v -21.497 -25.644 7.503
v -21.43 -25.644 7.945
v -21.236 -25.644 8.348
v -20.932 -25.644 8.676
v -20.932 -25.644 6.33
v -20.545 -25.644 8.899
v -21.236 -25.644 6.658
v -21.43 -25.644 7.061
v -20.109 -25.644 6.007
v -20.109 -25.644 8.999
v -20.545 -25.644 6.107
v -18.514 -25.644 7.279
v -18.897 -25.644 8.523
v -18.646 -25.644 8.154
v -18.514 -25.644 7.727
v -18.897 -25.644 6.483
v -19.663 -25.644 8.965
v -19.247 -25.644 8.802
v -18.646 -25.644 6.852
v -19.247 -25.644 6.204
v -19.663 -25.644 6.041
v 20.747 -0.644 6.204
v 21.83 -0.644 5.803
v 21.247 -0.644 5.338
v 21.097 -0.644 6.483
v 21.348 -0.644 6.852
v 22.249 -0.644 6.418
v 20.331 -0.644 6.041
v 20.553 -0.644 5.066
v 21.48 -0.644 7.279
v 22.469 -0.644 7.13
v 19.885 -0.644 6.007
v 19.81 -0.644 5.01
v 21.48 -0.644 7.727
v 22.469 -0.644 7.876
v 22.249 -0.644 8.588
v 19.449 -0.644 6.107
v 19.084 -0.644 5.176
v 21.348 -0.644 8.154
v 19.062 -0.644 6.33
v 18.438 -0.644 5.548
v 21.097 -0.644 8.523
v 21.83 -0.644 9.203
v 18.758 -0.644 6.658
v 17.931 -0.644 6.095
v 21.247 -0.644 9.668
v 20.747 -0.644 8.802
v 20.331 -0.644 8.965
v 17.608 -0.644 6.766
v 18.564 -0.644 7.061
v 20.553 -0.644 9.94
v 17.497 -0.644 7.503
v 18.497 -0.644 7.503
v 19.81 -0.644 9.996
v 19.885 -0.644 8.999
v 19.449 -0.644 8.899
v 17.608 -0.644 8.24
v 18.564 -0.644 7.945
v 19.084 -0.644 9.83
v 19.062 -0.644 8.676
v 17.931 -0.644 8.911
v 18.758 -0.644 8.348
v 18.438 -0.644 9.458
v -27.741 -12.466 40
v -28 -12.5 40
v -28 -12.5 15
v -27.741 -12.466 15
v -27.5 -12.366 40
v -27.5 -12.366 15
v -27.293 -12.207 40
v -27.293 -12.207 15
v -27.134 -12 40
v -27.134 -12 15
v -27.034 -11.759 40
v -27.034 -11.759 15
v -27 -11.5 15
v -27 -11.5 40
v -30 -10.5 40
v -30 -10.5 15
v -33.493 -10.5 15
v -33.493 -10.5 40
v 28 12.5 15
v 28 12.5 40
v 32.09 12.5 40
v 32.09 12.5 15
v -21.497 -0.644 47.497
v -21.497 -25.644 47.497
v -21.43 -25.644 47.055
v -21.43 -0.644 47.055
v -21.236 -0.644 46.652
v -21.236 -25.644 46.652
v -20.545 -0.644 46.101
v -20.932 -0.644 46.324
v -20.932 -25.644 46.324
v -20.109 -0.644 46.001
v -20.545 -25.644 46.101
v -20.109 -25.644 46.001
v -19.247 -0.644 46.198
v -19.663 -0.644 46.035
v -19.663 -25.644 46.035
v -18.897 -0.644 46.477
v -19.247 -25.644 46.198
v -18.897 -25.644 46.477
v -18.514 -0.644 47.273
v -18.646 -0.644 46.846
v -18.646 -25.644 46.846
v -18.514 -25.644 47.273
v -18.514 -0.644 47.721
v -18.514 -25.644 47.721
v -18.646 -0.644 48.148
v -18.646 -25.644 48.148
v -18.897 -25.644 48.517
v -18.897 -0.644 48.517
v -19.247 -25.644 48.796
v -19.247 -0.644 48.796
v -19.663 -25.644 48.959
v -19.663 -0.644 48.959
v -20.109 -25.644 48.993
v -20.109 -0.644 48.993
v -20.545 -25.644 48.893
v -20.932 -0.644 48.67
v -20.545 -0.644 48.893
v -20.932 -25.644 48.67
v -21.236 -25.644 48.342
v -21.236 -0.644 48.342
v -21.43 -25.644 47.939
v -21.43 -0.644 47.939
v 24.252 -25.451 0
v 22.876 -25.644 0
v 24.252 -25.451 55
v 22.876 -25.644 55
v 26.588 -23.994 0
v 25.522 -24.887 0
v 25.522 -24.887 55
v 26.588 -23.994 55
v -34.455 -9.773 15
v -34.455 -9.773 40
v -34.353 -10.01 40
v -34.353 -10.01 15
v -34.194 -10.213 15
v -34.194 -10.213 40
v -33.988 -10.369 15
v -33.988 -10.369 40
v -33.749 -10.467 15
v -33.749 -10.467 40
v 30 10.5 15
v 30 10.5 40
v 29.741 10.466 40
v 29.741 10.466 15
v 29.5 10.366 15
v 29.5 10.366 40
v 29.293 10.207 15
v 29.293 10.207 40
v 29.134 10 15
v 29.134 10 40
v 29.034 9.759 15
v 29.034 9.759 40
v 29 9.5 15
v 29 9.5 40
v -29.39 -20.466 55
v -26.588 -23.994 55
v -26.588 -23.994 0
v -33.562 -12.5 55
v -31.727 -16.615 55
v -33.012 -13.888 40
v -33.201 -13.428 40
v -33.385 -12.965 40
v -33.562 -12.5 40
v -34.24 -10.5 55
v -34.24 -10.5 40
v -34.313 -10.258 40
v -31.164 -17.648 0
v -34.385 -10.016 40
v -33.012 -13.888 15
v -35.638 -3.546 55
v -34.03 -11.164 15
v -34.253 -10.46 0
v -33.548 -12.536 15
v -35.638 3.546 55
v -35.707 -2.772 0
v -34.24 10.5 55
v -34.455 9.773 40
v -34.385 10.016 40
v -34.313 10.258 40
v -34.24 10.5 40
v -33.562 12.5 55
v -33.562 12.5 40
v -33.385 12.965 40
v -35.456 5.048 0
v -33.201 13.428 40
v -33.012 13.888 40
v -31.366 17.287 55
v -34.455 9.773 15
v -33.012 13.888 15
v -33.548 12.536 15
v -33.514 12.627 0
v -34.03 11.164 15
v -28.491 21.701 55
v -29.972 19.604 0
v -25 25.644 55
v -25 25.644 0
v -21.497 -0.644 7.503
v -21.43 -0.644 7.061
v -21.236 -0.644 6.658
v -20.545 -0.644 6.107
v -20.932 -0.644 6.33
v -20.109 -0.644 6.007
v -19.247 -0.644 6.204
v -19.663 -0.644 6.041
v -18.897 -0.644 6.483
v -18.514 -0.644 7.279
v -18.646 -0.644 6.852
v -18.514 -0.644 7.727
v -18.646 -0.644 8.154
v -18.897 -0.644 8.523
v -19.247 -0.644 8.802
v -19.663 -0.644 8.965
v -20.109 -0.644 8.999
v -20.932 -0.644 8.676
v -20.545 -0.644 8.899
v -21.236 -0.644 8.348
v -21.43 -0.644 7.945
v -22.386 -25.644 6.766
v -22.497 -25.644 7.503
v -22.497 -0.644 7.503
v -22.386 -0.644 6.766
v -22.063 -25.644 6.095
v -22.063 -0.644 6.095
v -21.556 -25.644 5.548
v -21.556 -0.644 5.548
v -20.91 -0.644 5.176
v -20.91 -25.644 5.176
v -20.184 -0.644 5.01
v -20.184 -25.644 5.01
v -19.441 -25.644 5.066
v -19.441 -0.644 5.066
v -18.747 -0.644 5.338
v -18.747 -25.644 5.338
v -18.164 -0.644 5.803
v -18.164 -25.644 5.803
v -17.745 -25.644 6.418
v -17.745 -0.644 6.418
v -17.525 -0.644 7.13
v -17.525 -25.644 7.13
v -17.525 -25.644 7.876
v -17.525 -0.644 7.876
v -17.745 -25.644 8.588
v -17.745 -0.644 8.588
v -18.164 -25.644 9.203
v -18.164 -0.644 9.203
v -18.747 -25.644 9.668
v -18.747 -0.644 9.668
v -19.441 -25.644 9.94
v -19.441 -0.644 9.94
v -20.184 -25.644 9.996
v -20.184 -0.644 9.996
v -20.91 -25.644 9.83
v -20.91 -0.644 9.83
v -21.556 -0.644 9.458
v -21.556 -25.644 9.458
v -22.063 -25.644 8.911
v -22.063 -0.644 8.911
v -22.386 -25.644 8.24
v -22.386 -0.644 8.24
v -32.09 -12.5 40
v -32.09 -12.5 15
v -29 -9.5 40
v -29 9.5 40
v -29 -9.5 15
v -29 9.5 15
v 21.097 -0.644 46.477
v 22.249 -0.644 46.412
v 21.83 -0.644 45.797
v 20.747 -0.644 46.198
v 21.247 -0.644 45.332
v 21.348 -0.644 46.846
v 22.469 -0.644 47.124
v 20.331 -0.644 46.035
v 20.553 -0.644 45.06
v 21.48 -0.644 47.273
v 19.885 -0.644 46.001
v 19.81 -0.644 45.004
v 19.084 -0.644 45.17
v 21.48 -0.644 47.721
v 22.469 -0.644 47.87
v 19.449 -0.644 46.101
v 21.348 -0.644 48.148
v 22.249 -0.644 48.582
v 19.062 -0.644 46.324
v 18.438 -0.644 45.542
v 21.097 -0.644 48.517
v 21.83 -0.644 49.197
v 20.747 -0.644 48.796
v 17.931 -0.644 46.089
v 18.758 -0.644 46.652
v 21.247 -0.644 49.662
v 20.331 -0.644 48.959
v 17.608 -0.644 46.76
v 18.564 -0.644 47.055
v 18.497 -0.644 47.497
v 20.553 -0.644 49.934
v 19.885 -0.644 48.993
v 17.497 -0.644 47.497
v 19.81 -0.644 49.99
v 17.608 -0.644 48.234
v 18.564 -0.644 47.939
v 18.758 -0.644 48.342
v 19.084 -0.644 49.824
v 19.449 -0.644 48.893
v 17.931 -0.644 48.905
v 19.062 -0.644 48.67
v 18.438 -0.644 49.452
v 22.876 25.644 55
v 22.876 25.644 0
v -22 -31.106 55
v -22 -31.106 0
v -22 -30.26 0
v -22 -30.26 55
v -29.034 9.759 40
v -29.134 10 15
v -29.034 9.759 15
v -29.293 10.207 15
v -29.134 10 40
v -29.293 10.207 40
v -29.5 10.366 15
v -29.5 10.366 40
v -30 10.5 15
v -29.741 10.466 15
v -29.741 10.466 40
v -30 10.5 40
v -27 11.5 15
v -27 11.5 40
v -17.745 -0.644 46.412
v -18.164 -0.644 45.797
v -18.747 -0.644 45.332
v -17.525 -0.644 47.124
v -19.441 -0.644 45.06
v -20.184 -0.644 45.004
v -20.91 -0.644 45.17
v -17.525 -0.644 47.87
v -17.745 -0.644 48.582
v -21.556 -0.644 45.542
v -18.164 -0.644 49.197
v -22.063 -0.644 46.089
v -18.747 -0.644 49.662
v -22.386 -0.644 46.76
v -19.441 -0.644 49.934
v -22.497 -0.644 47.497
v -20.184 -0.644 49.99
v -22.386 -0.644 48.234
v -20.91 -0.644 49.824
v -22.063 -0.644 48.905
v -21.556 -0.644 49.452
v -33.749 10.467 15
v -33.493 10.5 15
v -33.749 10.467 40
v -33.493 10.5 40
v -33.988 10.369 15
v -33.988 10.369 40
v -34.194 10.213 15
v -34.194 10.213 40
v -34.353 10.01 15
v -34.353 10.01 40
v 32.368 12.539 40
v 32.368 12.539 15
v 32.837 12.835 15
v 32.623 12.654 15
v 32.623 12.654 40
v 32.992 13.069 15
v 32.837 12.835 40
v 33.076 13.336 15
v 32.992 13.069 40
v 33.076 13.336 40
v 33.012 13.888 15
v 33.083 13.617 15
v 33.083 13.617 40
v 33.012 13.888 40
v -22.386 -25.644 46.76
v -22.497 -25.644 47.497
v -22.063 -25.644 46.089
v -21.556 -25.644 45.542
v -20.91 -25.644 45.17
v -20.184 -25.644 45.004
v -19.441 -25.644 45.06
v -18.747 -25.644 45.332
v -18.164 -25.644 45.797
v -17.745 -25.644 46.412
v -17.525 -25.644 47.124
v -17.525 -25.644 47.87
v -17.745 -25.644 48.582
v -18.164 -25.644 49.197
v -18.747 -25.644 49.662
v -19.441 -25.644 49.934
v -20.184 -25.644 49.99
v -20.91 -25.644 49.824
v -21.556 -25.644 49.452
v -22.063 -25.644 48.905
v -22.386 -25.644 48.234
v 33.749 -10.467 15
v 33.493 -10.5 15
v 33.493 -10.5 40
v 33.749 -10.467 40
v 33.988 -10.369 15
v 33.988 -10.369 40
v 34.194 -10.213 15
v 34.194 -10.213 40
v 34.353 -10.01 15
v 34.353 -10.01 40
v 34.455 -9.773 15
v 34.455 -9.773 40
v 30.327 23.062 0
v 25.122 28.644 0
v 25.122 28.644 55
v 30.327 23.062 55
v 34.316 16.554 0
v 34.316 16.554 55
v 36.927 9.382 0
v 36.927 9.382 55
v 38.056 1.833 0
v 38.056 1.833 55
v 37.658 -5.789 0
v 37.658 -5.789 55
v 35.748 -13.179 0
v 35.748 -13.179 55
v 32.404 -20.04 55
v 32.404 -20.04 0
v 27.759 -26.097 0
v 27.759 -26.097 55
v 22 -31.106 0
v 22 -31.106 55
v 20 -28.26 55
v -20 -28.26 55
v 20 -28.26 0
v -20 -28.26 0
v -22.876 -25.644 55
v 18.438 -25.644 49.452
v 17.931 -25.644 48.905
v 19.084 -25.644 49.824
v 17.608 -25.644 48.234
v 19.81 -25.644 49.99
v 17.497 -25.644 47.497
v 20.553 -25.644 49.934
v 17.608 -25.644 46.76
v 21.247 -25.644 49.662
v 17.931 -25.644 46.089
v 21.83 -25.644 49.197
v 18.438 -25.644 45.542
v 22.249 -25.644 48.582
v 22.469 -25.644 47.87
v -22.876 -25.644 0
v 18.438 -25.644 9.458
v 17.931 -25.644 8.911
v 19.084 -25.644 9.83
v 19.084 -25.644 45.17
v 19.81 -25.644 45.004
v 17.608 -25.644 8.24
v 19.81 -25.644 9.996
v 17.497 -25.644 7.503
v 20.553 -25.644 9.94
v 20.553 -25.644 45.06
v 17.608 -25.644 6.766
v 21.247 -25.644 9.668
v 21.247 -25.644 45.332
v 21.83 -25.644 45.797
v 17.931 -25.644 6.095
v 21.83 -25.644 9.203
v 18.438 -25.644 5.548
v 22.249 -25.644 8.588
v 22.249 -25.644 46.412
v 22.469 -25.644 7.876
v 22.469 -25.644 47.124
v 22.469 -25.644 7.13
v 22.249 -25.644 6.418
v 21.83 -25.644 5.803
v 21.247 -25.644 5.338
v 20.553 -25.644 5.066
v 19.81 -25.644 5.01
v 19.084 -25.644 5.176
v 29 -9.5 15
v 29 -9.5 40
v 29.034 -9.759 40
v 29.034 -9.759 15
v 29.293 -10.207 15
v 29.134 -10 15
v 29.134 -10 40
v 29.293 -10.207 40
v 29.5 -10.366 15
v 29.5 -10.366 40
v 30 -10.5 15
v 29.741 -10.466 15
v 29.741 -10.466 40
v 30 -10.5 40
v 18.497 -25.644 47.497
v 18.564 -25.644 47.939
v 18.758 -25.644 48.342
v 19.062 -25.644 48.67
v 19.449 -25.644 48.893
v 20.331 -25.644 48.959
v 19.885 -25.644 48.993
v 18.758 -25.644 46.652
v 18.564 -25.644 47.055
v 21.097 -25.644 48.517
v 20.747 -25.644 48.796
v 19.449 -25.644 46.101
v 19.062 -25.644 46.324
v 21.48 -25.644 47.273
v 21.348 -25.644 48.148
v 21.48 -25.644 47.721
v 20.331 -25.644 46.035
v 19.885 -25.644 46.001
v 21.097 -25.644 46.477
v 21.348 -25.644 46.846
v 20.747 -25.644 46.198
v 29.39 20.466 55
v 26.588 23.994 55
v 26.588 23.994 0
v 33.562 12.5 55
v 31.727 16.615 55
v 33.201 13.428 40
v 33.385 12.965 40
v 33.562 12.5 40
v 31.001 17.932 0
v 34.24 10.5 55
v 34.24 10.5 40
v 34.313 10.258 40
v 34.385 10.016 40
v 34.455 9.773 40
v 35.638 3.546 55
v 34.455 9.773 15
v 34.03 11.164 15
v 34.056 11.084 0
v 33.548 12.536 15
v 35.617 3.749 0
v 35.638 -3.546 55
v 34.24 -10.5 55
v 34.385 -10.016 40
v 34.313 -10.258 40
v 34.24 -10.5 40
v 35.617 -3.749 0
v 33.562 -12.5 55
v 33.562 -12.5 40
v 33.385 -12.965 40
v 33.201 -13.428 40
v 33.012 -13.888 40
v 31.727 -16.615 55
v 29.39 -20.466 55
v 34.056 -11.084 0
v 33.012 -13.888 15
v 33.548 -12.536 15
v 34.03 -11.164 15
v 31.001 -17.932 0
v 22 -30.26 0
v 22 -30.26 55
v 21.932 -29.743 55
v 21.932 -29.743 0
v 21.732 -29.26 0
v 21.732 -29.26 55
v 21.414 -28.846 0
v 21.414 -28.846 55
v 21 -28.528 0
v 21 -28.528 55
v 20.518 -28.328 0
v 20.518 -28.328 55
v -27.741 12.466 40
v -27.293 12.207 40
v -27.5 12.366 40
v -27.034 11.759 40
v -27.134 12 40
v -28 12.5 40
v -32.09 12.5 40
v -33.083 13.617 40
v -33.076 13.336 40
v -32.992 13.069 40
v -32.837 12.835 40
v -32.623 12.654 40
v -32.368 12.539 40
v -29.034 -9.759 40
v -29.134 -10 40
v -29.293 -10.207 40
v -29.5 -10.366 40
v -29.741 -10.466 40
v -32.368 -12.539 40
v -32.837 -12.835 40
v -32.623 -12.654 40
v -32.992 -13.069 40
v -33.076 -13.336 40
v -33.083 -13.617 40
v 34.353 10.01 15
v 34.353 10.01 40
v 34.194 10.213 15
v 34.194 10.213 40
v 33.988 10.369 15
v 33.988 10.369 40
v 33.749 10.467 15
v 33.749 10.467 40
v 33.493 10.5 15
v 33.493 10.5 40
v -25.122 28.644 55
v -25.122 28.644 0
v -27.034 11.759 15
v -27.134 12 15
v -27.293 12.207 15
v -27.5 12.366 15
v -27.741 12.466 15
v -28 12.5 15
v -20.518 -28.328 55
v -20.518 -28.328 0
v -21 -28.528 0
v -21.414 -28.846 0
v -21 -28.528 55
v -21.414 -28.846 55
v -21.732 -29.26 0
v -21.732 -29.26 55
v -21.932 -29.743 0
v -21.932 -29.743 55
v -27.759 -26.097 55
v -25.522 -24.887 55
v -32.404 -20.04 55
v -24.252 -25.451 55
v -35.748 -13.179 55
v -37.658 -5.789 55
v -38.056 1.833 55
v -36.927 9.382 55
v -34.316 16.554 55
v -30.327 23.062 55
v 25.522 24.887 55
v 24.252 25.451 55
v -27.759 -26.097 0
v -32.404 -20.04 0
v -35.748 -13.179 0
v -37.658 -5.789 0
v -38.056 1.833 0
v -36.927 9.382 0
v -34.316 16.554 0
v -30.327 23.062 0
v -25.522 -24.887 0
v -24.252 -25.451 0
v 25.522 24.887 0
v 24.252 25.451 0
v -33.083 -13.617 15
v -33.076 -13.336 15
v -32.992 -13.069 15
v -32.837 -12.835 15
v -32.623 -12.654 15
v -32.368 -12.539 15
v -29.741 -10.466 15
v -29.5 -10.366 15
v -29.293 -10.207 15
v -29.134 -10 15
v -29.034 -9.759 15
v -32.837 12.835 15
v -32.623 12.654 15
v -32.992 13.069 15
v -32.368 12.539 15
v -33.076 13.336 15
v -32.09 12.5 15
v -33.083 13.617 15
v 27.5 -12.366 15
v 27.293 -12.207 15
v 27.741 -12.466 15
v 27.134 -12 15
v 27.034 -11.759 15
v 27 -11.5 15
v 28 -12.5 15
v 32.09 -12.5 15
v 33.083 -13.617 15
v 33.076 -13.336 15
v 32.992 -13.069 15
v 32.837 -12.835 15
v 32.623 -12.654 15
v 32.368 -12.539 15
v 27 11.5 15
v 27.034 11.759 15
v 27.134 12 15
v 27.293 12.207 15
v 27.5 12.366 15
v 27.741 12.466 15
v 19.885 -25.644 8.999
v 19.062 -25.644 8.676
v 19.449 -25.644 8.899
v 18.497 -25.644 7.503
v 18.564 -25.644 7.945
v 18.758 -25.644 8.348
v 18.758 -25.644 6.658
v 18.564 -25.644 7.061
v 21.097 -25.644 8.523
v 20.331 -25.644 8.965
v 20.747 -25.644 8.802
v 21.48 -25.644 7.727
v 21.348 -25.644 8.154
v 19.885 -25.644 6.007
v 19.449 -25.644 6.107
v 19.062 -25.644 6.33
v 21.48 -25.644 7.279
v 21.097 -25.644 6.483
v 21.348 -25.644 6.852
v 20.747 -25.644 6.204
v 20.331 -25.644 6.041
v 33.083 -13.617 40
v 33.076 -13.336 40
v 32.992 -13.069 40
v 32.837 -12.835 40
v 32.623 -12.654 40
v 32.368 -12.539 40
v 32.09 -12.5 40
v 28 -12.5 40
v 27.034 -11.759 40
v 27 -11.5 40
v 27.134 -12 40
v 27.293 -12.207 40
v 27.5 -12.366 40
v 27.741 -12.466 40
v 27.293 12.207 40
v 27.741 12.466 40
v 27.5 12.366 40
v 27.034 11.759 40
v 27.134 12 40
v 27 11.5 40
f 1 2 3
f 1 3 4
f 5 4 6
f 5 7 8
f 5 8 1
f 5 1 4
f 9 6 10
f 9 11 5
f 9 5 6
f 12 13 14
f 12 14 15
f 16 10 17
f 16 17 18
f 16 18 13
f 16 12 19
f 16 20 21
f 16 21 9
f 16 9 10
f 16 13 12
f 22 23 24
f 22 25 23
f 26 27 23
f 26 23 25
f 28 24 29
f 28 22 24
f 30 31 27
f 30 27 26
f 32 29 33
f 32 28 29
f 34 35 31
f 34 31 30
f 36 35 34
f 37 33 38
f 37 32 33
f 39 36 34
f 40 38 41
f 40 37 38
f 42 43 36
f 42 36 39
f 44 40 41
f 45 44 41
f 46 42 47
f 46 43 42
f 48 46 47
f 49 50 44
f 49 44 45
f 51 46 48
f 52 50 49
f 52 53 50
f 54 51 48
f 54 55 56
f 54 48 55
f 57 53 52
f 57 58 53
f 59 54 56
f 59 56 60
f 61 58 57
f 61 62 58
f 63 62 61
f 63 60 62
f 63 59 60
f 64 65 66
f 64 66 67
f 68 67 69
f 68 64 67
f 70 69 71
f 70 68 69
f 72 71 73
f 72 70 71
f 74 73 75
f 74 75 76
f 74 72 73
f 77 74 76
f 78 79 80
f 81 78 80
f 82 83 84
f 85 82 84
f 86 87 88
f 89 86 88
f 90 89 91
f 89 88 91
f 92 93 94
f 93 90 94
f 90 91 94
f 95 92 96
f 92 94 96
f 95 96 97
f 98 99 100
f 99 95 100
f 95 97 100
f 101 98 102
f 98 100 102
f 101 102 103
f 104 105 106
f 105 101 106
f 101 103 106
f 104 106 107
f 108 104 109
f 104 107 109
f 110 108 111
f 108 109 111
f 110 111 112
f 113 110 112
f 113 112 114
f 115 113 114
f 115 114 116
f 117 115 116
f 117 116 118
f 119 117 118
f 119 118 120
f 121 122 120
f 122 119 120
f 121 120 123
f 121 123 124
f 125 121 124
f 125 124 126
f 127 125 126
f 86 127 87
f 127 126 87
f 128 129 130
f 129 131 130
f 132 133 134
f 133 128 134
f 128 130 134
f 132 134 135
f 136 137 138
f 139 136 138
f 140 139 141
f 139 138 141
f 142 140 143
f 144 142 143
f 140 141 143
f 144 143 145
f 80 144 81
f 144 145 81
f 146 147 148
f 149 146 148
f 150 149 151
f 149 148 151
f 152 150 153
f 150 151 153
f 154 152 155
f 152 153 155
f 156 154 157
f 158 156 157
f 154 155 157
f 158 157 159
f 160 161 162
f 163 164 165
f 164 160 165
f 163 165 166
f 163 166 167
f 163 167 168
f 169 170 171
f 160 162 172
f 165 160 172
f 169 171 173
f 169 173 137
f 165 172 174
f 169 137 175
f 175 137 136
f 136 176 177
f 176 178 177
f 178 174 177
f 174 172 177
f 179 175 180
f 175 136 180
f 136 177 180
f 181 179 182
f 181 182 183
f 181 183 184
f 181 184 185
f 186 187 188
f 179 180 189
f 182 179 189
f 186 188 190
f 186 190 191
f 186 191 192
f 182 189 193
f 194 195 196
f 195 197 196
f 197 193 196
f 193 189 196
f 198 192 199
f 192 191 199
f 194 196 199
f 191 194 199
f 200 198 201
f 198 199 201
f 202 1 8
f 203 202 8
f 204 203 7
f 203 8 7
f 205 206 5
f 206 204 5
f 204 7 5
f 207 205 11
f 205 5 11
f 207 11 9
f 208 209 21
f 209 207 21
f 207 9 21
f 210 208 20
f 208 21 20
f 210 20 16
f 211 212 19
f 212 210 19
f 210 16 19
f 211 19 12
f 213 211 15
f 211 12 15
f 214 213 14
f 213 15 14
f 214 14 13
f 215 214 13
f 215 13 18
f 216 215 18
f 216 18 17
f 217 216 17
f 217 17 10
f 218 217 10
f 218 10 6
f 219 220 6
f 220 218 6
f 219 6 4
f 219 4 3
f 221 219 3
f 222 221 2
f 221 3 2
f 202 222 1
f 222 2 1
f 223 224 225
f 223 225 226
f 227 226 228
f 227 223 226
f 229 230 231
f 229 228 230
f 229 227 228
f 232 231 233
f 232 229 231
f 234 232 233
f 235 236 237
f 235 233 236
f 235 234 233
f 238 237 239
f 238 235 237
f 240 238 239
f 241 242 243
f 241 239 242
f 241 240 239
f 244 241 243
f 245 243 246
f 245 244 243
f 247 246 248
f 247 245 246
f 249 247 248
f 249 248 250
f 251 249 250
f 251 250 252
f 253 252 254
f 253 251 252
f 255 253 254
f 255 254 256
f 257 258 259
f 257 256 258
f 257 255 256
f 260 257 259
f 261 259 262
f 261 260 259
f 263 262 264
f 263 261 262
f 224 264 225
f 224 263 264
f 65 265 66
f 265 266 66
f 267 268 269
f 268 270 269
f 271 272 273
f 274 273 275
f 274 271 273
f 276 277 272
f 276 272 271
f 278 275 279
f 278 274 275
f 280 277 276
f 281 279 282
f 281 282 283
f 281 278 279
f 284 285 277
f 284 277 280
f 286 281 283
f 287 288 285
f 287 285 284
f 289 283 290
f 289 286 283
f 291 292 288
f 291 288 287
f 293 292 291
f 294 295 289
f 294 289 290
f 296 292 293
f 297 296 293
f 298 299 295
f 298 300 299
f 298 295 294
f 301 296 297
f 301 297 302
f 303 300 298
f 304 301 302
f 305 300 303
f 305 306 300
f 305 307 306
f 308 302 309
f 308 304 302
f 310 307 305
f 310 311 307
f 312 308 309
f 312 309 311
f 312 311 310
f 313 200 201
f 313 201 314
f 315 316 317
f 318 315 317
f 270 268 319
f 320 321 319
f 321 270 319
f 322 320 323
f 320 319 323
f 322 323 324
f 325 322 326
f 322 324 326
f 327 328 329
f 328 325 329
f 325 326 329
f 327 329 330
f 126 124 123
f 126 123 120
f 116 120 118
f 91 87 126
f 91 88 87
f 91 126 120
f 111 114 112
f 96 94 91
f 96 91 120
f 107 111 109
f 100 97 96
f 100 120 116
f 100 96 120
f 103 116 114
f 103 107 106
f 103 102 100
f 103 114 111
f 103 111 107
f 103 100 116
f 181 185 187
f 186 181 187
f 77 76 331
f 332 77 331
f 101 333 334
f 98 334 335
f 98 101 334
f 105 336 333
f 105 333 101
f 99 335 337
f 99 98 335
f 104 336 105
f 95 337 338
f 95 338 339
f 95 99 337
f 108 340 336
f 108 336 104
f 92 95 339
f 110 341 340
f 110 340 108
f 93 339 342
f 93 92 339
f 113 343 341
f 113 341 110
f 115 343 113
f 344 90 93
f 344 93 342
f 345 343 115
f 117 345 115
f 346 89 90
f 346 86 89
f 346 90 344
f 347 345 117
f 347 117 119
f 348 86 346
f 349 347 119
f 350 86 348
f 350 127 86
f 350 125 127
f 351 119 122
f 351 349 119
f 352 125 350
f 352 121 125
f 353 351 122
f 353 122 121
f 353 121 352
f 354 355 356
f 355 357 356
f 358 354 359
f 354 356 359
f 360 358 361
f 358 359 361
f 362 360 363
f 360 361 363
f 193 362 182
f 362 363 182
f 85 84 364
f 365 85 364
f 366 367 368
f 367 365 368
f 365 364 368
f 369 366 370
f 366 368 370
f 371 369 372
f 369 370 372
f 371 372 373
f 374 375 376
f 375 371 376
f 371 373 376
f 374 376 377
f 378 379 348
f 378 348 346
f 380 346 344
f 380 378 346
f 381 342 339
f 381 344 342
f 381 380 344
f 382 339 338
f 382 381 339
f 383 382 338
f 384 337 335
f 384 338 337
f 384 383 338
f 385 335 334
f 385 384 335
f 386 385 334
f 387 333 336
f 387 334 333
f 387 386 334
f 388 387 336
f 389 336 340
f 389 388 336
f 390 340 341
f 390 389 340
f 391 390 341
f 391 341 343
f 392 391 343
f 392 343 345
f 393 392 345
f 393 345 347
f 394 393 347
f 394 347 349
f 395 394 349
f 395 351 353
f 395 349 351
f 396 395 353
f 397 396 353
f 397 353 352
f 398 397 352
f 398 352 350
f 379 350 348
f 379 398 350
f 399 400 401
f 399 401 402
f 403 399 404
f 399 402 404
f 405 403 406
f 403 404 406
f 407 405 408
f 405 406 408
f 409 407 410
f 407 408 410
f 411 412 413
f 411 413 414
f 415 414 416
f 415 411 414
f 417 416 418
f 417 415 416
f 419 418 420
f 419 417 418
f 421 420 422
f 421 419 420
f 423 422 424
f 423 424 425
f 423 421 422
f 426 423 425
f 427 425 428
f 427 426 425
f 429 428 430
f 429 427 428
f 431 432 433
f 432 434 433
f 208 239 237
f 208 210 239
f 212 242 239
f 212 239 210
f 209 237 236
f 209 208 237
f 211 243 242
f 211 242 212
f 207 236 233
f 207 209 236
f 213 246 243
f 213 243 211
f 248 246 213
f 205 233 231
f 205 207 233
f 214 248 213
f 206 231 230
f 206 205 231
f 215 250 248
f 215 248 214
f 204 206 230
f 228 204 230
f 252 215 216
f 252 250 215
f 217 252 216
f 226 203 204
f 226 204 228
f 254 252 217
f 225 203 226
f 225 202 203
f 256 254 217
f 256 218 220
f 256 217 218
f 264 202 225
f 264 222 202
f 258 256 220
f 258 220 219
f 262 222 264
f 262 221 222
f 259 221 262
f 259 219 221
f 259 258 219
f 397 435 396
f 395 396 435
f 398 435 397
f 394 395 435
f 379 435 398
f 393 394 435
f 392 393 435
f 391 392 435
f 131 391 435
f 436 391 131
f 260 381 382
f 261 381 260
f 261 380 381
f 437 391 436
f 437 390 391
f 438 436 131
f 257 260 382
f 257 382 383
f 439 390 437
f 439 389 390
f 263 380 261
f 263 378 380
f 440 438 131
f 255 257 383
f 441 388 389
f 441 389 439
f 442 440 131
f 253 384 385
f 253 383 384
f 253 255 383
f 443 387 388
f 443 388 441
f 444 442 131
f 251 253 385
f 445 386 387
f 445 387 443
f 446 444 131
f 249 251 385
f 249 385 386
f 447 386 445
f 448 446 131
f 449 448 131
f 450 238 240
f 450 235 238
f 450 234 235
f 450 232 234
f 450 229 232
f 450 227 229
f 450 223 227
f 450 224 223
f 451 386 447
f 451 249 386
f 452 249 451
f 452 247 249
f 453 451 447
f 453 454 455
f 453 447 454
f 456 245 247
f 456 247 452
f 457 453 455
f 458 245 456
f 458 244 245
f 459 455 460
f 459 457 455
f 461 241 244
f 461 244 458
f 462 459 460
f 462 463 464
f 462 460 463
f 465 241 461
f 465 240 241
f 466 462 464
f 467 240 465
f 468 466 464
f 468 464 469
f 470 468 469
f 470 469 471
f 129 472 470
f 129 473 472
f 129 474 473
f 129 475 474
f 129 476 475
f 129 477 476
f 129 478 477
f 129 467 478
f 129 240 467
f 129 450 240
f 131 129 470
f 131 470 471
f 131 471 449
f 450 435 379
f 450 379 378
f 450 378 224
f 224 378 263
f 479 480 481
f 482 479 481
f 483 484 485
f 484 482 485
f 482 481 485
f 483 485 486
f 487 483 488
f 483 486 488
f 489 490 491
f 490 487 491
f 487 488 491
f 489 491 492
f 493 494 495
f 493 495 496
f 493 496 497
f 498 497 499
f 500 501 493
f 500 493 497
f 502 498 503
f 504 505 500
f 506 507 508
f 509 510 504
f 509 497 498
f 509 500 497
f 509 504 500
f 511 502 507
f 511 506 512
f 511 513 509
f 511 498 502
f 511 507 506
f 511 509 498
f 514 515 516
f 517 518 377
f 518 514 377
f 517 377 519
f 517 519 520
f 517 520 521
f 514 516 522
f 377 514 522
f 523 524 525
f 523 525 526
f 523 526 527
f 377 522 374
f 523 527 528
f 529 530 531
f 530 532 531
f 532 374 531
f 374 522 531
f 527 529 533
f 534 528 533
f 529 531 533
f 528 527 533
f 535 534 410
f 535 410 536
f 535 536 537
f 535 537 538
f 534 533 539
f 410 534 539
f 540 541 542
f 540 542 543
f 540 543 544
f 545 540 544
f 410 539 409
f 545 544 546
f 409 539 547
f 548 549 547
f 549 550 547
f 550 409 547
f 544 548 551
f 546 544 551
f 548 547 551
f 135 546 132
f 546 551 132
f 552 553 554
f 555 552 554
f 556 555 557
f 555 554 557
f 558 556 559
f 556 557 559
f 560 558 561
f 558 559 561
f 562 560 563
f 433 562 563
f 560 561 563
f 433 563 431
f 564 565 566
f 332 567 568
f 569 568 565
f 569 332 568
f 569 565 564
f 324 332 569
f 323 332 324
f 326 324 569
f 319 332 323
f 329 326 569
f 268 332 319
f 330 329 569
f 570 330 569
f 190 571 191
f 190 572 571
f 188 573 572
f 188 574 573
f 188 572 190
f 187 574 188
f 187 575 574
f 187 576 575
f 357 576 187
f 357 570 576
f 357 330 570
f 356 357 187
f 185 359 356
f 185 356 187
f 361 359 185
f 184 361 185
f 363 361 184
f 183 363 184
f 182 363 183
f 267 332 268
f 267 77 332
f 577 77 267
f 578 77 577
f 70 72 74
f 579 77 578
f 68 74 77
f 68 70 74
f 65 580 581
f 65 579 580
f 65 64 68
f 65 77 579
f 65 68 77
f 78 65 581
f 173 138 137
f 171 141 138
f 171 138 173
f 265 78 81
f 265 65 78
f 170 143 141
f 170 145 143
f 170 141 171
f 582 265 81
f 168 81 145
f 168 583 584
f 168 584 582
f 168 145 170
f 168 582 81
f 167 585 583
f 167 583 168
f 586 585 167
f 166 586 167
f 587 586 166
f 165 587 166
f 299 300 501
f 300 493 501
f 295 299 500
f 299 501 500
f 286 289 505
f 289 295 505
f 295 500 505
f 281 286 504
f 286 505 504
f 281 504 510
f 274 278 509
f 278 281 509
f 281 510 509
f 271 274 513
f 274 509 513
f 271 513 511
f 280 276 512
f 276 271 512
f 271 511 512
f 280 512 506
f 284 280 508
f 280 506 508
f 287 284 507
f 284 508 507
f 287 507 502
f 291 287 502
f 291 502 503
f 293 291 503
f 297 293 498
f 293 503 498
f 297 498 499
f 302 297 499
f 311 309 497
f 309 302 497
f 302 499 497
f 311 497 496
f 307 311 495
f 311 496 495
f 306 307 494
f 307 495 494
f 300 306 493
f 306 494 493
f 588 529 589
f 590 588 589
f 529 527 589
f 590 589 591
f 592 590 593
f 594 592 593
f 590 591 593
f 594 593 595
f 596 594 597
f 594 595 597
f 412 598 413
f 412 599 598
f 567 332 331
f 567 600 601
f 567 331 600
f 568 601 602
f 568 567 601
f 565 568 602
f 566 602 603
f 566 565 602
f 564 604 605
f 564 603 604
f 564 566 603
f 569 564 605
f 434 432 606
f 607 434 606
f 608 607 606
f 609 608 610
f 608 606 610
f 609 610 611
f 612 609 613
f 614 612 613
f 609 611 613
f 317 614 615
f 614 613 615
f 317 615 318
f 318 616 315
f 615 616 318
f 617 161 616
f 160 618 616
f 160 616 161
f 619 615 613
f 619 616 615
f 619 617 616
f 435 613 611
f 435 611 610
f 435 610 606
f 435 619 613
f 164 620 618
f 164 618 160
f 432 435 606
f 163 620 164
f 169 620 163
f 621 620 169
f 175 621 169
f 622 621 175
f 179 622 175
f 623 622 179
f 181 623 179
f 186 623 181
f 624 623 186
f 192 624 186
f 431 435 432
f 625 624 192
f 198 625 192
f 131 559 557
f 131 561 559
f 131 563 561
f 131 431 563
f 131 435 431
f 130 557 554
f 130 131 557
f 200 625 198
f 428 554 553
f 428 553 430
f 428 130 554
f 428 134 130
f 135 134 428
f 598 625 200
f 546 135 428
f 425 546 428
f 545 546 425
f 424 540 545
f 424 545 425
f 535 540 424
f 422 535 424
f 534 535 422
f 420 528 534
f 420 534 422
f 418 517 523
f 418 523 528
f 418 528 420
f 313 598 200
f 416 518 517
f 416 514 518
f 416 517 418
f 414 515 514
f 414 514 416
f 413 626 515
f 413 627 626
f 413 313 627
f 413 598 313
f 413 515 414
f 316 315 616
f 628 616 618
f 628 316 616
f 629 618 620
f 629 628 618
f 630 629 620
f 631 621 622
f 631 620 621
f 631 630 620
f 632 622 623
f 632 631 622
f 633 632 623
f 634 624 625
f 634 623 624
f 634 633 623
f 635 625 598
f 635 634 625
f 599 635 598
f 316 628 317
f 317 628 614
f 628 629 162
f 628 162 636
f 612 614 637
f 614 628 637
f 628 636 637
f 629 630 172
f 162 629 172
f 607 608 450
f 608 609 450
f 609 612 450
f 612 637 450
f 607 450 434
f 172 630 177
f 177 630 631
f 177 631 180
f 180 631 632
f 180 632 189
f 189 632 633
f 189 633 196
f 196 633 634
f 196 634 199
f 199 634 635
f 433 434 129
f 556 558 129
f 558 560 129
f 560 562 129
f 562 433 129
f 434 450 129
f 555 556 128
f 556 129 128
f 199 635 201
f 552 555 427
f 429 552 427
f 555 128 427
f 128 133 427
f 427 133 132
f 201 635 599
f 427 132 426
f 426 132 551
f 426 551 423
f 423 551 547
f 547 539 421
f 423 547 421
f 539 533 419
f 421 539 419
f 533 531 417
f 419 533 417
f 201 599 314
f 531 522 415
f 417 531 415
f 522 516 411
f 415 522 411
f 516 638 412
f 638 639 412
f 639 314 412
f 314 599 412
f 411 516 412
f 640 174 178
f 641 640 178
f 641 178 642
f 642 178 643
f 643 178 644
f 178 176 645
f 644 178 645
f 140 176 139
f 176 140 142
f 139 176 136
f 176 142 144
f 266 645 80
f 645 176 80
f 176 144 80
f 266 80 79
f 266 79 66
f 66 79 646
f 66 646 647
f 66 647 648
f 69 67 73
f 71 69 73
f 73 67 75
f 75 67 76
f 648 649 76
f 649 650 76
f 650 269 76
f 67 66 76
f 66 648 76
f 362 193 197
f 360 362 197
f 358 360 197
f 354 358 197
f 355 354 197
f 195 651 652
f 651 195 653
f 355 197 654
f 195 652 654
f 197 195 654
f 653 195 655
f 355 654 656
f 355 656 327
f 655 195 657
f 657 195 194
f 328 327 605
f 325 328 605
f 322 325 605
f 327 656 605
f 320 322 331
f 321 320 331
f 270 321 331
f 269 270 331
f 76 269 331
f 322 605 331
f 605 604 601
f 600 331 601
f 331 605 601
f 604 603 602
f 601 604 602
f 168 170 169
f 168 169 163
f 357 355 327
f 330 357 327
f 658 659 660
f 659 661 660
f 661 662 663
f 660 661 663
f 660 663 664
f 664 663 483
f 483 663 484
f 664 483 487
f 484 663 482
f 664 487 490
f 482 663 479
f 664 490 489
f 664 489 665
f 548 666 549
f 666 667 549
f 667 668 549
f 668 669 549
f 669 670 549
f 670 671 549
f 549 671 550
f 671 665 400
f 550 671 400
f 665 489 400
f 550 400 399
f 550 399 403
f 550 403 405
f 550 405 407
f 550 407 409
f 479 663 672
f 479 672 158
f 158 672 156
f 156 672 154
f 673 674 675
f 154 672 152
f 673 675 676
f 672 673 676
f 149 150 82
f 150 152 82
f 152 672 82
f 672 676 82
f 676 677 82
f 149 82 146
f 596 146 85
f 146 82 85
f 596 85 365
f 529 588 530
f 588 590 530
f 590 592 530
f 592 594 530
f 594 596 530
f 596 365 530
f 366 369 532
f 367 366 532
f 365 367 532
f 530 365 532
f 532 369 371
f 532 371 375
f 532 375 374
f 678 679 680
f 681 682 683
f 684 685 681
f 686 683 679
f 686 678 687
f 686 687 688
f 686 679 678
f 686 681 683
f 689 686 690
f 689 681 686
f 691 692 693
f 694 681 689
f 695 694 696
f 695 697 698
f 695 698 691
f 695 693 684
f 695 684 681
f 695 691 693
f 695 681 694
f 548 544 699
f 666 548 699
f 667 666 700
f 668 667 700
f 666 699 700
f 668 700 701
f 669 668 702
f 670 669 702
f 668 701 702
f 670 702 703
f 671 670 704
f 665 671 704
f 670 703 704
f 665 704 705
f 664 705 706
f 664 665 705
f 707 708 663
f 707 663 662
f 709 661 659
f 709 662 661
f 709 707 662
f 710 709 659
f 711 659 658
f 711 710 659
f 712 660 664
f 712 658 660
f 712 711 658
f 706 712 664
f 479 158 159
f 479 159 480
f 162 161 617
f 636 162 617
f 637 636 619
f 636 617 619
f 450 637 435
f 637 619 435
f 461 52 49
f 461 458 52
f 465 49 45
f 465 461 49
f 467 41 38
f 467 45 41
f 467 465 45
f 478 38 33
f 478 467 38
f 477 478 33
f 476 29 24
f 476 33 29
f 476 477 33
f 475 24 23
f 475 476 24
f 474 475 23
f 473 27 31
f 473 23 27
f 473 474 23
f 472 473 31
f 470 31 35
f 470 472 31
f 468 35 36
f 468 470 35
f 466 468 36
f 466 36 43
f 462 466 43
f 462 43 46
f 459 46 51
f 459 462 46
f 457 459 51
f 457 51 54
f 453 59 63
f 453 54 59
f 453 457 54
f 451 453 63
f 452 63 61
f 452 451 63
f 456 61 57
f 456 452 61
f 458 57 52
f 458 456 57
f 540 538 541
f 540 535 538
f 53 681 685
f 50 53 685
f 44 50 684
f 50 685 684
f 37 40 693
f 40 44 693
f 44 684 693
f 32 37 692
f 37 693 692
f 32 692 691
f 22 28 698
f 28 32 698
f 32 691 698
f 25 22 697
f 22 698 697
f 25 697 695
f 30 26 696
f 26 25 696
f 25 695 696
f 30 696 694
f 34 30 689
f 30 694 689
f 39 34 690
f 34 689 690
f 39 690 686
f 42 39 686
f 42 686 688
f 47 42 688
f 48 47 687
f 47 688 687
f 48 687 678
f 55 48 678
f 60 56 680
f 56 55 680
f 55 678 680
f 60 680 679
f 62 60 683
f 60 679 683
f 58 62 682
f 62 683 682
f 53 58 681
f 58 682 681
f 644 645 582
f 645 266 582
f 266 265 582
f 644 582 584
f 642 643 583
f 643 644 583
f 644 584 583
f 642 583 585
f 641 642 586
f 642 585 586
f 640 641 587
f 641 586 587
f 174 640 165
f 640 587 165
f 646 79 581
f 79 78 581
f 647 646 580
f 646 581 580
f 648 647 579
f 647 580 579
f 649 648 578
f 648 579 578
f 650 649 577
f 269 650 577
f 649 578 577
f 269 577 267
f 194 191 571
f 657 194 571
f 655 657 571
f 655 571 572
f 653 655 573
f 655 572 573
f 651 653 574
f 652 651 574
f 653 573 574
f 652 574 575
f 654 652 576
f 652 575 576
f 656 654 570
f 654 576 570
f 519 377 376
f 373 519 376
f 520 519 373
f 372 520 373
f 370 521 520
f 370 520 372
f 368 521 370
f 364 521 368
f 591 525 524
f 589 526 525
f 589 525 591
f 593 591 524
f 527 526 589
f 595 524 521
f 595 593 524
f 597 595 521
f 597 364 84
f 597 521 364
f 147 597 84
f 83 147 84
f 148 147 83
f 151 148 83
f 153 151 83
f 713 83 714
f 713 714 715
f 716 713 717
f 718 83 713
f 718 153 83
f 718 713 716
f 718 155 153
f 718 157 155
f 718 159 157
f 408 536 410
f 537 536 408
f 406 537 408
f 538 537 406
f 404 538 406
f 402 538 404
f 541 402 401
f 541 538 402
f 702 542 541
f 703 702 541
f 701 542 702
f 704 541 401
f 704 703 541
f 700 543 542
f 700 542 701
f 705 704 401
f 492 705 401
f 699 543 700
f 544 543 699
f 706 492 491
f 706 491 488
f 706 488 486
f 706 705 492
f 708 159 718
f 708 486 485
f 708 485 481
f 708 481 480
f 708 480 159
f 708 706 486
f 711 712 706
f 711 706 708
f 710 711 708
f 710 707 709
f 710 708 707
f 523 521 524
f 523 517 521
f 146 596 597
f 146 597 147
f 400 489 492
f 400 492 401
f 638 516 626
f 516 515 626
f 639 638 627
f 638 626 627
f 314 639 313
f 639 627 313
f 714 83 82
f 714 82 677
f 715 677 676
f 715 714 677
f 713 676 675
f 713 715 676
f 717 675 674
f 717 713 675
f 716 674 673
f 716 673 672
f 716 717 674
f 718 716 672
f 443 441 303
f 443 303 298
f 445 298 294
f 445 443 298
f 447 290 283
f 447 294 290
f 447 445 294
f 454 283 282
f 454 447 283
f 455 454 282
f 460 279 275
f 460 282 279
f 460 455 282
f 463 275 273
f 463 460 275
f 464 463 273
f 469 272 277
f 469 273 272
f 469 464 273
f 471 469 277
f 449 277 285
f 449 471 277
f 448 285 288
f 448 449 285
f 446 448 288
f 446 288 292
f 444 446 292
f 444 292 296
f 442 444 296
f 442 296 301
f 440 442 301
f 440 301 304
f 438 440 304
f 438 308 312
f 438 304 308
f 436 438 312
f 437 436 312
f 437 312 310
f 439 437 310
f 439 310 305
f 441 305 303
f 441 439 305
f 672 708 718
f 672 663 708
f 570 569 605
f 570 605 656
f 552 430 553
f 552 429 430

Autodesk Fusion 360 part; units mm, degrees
sketch "Sketch1" plane through (0, 0, 0) normal (0, 0, 1) x (1, 0, 0)
  circle A0 centre (0, 0) radius 35.814
  circle A1 centre (0, 0) radius 38.1
  line L0 (-25, -25.6445) -> (25, -25.6445)
  line L1 (-25, 25.6445) -> (-25, -25.6445)
  line L2 (-25, 25.6445) -> (28.1774, 25.6445)
  line L3 (-25, 25.6445) -> (-28.1774, 25.6445)
  line L4 (-22, -31.1064) -> (-22, -28.2603)
  line L5 (-22, -28.2603) -> (22, -28.2603)
  line L6 (22, -31.1064) -> (22, -28.2603)
  line L7 (-25.1217, 28.6445) -> (25.1217, 28.6445)
  line L8 (12.5, 25.6445) -> (-12.5, 25.6445)
  line L9 (-12.5, 25.6445) -> (-12.5, 21.6445)
  line L10 (-12.5, 21.6445) -> (12.5, 21.6445)
  line L11 (12.5, 21.6445) -> (12.5, 25.6445)
  line L12 (14.5, 25.6445) -> (-14.5, 25.6445)
  line L13 (-14.5, 25.6445) -> (-14.5, 19.6445)
  line L14 (-14.5, 19.6445) -> (14.5, 19.6445)
  line L15 (14.5, 19.6445) -> (14.5, 25.6445)
  line L16 (0, 21.6445) -> (0, 25.6445)
  line L17 (0, 25.6445) -> (0, 0) construction
  line L18 (34.2402, 10.5) -> (29, 10.5)
  line L19 (29, 10.5) -> (29, -10.5)
  line L20 (29, -10.5) -> (34.2402, -10.5)
  line L21 (33.5618, -12.5) -> (27, -12.5)
  line L22 (27, -12.5) -> (27, 12.5)
  line L23 (27, 12.5) -> (33.5618, 12.5)
  line L24 (27, 0) -> (0, 0) construction
  line L25 (-27, -12.5) -> (-27, 12.5)
  line L26 (-29, 10.5) -> (-29, -10.5)
  line L27 (-34.2402, 10.5) -> (-29, 10.5)
  line L28 (-27, 12.5) -> (-33.5618, 12.5)
  line L29 (-29, -10.5) -> (-34.2402, -10.5)
  line L30 (-33.5618, -12.5) -> (-27, -12.5)
  dimension "d1" = 76.2
  dimension "d3" = 50
  dimension "d15" = 3
  dimension "d16" = 3
  dimension "d24" = 2
  dimension "d25" = 2
  dimension "d26" = 2
  dimension "d27" = 25
  dimension "d28" = 6
  dimension "d37" = 2
  dimension "d38" = 25
  dimension "d39" = 2
  dimension "d40" = 2
  dimension "d41" = 2
  dimension "d60" = 71.628
extrude "Extrude1" add sketch "Sketch1" along normal blind 55 contours A0 A1 L2 L6 | A0 L18 L19 L20 L21 L22 L23 | A0 L2 L7 L8 L12 | A0 A1 L2 L7 | A0 L0 L5 | A0 A1 L3 L4 | A0 A1 L3 L7 | A0 L25 L26 L27 L28 L29 L30
sketch "Sketch3" plane through (0, -25.6445, 0) normal (0, 1, 0) x (-1, 0, 0)
  line L0 (-25, 0) -> (25, 0)
  line L1 (25, 0) -> (25, 55)
  line L2 (25, 55) -> (-25, 55)
  line L3 (-25, 55) -> (-25, 0)
  line L4 (0, 0) -> (0, 27.5) construction
  line L5 (-25, 27.5) -> (0, 27.5) construction
  line L6 (0, 27.5) -> (-19.997, 7.503) construction
  circle A0 centre (-19.997, 7.503) radius 1.5
  circle A1 centre (-19.997, 7.503) radius 2.5
  circle A2 centre (19.997, 7.503) radius 2.5
  circle A3 centre (19.997, 7.503) radius 1.5
  circle A4 centre (19.997, 47.497) radius 2.5
  circle A5 centre (19.997, 47.497) radius 1.5
  circle A6 centre (-19.997, 47.497) radius 2.5
  circle A7 centre (-19.997, 47.497) radius 1.5
  dimension "d7" = 45
  dimension "d8" = 28.28
  dimension "d9" = 3
  dimension "d10" = 5
  dimension "d12" = 360
extrude "Extrude2" add sketch "Sketch3" along normal blind 25 contours A1 | A2 | A4 | A6
fillet "Fillet1" radius 2 2 edges at (22, -28.2603, 27.5) (-22, -28.2603, 27.5)
fillet "Fillet2" radius 5 4 edges at (25, -25.6445, 27.5) (25, -25.6445, 27.5) (25, 25.6445, 27.5) (25, 25.6445, 27.5)
extrude "Extrude3" cut sketch "Sketch1" along normal blind 15 contours A0 L18 L19 L20 L21 L22 L23 | L2 L9 L10 L11 L12 L13 L14 L15 | A0 L25 L26 L27 L28 L29 L30
sketch "Sketch5" plane through (0, 0, 55) normal (0, 0, 1) x (-1, 0, 0)
  arc A0 (34.2402, -10.5) -> (34.2402, 10.5) centre (0, 0) ccw
  line L0 (34.2402, -10.5) -> (29, -10.5)
  line L1 (29, -10.5) -> (29, 10.5)
  line L2 (29, 10.5) -> (34.2402, 10.5)
  line L3 (-22.8759, 25.6445) -> (25, 25.6445)
  arc A1 (33.5618, 12.5) -> (25, 25.6445) centre (0, 0) ccw
  line L4 (33.5618, 12.5) -> (27, 12.5)
  line L5 (27, 12.5) -> (27, -12.5)
  line L6 (27, -12.5) -> (33.5618, -12.5)
  arc A2 (25, -25.6445) -> (33.5618, -12.5) centre (0, 0) ccw
  line L7 (25, -25.6445) -> (-22.8759, -25.6445)
  arc A3 (-26.5878, -23.9944) -> (-22.8759, -25.6445) centre (-22.8759, -20.6445) ccw
  arc A4 (-33.5618, -12.5) -> (-26.5878, -23.9944) centre (0, 0) ccw
  line L8 (-33.5618, -12.5) -> (-27, -12.5)
  line L9 (-27, -12.5) -> (-27, 12.5)
  line L10 (-27, 12.5) -> (-33.5618, 12.5)
  arc A5 (-26.5878, 23.9944) -> (-33.5618, 12.5) centre (0, 0) ccw
  arc A6 (-22.8759, 25.6445) -> (-26.5878, 23.9944) centre (-22.8759, 20.6445) ccw
  line L11 (-34.2402, 10.5) -> (-29, 10.5)
  line L12 (-29, 10.5) -> (-29, -10.5)
  line L13 (-29, -10.5) -> (-34.2402, -10.5)
  arc A7 (-34.2402, 10.5) -> (-34.2402, -10.5) centre (0, 0) ccw
  line L14 (22, 31.1064) -> (22, 30.2603)
  arc A8 (20, 28.2603) -> (22, 30.2603) centre (20, 30.2603) ccw
  line L15 (20, 28.2603) -> (-20, 28.2603)
  arc A9 (-22, 30.2603) -> (-20, 28.2603) centre (-20, 30.2603) ccw
  line L16 (-22, 30.2603) -> (-22, 31.1064)
  arc A10 (-22, 31.1064) -> (-25.1217, -28.6445) centre (0, 0) ccw
  line L17 (-25.1217, -28.6445) -> (25.1217, -28.6445)
  arc A11 (25.1217, -28.6445) -> (22, 31.1064) centre (0, 0) ccw
  line L18 (-33.5618, -12.5) -> (-34.2402, -10.5)
  line L19 (-34.2402, 10.5) -> (-33.5618, 12.5)
  line L20 (34.2402, 10.5) -> (33.5618, 12.5)
  line L21 (34.2402, -10.5) -> (33.5618, -12.5)
extrude "Extrude5" cut sketch "Sketch5" against normal blind 15 contours L0 L1 L2 L4 L5 L6 L20 L21 | L8 L9 L10 L11 L12 L13 L18 L19
fillet "Fillet6" radius 5 1 edges at (-25, -25.6445, 27.5)
fillet "Fillet7" radius 1 15 edges at (27, 12.5, 27.5) (27, -12.5, 27.5) (33.5618, -12.5, 27.5) (34.2402, 10.5, 27.5) (33.5618, 12.5, 27.5) (-27, 12.5, 27.5) (-27, -12.5, 27.5) (-34.2402, -10.5, 27.5) (-29, -10.5, 27.5) (-29, 10.5, 27.5) (-33.5618, 12.5, 27.5) (-33.5618, -12.5, 27.5) (29, -10.5, 27.5) (29, 10.5, 27.5) (34.2402, -10.5, 27.5)
fillet "Fillet8" radius 1 1 edges at (-34.2402, 10.5, 27.5)
equation "d8 = 20 * 1.414 mm"
